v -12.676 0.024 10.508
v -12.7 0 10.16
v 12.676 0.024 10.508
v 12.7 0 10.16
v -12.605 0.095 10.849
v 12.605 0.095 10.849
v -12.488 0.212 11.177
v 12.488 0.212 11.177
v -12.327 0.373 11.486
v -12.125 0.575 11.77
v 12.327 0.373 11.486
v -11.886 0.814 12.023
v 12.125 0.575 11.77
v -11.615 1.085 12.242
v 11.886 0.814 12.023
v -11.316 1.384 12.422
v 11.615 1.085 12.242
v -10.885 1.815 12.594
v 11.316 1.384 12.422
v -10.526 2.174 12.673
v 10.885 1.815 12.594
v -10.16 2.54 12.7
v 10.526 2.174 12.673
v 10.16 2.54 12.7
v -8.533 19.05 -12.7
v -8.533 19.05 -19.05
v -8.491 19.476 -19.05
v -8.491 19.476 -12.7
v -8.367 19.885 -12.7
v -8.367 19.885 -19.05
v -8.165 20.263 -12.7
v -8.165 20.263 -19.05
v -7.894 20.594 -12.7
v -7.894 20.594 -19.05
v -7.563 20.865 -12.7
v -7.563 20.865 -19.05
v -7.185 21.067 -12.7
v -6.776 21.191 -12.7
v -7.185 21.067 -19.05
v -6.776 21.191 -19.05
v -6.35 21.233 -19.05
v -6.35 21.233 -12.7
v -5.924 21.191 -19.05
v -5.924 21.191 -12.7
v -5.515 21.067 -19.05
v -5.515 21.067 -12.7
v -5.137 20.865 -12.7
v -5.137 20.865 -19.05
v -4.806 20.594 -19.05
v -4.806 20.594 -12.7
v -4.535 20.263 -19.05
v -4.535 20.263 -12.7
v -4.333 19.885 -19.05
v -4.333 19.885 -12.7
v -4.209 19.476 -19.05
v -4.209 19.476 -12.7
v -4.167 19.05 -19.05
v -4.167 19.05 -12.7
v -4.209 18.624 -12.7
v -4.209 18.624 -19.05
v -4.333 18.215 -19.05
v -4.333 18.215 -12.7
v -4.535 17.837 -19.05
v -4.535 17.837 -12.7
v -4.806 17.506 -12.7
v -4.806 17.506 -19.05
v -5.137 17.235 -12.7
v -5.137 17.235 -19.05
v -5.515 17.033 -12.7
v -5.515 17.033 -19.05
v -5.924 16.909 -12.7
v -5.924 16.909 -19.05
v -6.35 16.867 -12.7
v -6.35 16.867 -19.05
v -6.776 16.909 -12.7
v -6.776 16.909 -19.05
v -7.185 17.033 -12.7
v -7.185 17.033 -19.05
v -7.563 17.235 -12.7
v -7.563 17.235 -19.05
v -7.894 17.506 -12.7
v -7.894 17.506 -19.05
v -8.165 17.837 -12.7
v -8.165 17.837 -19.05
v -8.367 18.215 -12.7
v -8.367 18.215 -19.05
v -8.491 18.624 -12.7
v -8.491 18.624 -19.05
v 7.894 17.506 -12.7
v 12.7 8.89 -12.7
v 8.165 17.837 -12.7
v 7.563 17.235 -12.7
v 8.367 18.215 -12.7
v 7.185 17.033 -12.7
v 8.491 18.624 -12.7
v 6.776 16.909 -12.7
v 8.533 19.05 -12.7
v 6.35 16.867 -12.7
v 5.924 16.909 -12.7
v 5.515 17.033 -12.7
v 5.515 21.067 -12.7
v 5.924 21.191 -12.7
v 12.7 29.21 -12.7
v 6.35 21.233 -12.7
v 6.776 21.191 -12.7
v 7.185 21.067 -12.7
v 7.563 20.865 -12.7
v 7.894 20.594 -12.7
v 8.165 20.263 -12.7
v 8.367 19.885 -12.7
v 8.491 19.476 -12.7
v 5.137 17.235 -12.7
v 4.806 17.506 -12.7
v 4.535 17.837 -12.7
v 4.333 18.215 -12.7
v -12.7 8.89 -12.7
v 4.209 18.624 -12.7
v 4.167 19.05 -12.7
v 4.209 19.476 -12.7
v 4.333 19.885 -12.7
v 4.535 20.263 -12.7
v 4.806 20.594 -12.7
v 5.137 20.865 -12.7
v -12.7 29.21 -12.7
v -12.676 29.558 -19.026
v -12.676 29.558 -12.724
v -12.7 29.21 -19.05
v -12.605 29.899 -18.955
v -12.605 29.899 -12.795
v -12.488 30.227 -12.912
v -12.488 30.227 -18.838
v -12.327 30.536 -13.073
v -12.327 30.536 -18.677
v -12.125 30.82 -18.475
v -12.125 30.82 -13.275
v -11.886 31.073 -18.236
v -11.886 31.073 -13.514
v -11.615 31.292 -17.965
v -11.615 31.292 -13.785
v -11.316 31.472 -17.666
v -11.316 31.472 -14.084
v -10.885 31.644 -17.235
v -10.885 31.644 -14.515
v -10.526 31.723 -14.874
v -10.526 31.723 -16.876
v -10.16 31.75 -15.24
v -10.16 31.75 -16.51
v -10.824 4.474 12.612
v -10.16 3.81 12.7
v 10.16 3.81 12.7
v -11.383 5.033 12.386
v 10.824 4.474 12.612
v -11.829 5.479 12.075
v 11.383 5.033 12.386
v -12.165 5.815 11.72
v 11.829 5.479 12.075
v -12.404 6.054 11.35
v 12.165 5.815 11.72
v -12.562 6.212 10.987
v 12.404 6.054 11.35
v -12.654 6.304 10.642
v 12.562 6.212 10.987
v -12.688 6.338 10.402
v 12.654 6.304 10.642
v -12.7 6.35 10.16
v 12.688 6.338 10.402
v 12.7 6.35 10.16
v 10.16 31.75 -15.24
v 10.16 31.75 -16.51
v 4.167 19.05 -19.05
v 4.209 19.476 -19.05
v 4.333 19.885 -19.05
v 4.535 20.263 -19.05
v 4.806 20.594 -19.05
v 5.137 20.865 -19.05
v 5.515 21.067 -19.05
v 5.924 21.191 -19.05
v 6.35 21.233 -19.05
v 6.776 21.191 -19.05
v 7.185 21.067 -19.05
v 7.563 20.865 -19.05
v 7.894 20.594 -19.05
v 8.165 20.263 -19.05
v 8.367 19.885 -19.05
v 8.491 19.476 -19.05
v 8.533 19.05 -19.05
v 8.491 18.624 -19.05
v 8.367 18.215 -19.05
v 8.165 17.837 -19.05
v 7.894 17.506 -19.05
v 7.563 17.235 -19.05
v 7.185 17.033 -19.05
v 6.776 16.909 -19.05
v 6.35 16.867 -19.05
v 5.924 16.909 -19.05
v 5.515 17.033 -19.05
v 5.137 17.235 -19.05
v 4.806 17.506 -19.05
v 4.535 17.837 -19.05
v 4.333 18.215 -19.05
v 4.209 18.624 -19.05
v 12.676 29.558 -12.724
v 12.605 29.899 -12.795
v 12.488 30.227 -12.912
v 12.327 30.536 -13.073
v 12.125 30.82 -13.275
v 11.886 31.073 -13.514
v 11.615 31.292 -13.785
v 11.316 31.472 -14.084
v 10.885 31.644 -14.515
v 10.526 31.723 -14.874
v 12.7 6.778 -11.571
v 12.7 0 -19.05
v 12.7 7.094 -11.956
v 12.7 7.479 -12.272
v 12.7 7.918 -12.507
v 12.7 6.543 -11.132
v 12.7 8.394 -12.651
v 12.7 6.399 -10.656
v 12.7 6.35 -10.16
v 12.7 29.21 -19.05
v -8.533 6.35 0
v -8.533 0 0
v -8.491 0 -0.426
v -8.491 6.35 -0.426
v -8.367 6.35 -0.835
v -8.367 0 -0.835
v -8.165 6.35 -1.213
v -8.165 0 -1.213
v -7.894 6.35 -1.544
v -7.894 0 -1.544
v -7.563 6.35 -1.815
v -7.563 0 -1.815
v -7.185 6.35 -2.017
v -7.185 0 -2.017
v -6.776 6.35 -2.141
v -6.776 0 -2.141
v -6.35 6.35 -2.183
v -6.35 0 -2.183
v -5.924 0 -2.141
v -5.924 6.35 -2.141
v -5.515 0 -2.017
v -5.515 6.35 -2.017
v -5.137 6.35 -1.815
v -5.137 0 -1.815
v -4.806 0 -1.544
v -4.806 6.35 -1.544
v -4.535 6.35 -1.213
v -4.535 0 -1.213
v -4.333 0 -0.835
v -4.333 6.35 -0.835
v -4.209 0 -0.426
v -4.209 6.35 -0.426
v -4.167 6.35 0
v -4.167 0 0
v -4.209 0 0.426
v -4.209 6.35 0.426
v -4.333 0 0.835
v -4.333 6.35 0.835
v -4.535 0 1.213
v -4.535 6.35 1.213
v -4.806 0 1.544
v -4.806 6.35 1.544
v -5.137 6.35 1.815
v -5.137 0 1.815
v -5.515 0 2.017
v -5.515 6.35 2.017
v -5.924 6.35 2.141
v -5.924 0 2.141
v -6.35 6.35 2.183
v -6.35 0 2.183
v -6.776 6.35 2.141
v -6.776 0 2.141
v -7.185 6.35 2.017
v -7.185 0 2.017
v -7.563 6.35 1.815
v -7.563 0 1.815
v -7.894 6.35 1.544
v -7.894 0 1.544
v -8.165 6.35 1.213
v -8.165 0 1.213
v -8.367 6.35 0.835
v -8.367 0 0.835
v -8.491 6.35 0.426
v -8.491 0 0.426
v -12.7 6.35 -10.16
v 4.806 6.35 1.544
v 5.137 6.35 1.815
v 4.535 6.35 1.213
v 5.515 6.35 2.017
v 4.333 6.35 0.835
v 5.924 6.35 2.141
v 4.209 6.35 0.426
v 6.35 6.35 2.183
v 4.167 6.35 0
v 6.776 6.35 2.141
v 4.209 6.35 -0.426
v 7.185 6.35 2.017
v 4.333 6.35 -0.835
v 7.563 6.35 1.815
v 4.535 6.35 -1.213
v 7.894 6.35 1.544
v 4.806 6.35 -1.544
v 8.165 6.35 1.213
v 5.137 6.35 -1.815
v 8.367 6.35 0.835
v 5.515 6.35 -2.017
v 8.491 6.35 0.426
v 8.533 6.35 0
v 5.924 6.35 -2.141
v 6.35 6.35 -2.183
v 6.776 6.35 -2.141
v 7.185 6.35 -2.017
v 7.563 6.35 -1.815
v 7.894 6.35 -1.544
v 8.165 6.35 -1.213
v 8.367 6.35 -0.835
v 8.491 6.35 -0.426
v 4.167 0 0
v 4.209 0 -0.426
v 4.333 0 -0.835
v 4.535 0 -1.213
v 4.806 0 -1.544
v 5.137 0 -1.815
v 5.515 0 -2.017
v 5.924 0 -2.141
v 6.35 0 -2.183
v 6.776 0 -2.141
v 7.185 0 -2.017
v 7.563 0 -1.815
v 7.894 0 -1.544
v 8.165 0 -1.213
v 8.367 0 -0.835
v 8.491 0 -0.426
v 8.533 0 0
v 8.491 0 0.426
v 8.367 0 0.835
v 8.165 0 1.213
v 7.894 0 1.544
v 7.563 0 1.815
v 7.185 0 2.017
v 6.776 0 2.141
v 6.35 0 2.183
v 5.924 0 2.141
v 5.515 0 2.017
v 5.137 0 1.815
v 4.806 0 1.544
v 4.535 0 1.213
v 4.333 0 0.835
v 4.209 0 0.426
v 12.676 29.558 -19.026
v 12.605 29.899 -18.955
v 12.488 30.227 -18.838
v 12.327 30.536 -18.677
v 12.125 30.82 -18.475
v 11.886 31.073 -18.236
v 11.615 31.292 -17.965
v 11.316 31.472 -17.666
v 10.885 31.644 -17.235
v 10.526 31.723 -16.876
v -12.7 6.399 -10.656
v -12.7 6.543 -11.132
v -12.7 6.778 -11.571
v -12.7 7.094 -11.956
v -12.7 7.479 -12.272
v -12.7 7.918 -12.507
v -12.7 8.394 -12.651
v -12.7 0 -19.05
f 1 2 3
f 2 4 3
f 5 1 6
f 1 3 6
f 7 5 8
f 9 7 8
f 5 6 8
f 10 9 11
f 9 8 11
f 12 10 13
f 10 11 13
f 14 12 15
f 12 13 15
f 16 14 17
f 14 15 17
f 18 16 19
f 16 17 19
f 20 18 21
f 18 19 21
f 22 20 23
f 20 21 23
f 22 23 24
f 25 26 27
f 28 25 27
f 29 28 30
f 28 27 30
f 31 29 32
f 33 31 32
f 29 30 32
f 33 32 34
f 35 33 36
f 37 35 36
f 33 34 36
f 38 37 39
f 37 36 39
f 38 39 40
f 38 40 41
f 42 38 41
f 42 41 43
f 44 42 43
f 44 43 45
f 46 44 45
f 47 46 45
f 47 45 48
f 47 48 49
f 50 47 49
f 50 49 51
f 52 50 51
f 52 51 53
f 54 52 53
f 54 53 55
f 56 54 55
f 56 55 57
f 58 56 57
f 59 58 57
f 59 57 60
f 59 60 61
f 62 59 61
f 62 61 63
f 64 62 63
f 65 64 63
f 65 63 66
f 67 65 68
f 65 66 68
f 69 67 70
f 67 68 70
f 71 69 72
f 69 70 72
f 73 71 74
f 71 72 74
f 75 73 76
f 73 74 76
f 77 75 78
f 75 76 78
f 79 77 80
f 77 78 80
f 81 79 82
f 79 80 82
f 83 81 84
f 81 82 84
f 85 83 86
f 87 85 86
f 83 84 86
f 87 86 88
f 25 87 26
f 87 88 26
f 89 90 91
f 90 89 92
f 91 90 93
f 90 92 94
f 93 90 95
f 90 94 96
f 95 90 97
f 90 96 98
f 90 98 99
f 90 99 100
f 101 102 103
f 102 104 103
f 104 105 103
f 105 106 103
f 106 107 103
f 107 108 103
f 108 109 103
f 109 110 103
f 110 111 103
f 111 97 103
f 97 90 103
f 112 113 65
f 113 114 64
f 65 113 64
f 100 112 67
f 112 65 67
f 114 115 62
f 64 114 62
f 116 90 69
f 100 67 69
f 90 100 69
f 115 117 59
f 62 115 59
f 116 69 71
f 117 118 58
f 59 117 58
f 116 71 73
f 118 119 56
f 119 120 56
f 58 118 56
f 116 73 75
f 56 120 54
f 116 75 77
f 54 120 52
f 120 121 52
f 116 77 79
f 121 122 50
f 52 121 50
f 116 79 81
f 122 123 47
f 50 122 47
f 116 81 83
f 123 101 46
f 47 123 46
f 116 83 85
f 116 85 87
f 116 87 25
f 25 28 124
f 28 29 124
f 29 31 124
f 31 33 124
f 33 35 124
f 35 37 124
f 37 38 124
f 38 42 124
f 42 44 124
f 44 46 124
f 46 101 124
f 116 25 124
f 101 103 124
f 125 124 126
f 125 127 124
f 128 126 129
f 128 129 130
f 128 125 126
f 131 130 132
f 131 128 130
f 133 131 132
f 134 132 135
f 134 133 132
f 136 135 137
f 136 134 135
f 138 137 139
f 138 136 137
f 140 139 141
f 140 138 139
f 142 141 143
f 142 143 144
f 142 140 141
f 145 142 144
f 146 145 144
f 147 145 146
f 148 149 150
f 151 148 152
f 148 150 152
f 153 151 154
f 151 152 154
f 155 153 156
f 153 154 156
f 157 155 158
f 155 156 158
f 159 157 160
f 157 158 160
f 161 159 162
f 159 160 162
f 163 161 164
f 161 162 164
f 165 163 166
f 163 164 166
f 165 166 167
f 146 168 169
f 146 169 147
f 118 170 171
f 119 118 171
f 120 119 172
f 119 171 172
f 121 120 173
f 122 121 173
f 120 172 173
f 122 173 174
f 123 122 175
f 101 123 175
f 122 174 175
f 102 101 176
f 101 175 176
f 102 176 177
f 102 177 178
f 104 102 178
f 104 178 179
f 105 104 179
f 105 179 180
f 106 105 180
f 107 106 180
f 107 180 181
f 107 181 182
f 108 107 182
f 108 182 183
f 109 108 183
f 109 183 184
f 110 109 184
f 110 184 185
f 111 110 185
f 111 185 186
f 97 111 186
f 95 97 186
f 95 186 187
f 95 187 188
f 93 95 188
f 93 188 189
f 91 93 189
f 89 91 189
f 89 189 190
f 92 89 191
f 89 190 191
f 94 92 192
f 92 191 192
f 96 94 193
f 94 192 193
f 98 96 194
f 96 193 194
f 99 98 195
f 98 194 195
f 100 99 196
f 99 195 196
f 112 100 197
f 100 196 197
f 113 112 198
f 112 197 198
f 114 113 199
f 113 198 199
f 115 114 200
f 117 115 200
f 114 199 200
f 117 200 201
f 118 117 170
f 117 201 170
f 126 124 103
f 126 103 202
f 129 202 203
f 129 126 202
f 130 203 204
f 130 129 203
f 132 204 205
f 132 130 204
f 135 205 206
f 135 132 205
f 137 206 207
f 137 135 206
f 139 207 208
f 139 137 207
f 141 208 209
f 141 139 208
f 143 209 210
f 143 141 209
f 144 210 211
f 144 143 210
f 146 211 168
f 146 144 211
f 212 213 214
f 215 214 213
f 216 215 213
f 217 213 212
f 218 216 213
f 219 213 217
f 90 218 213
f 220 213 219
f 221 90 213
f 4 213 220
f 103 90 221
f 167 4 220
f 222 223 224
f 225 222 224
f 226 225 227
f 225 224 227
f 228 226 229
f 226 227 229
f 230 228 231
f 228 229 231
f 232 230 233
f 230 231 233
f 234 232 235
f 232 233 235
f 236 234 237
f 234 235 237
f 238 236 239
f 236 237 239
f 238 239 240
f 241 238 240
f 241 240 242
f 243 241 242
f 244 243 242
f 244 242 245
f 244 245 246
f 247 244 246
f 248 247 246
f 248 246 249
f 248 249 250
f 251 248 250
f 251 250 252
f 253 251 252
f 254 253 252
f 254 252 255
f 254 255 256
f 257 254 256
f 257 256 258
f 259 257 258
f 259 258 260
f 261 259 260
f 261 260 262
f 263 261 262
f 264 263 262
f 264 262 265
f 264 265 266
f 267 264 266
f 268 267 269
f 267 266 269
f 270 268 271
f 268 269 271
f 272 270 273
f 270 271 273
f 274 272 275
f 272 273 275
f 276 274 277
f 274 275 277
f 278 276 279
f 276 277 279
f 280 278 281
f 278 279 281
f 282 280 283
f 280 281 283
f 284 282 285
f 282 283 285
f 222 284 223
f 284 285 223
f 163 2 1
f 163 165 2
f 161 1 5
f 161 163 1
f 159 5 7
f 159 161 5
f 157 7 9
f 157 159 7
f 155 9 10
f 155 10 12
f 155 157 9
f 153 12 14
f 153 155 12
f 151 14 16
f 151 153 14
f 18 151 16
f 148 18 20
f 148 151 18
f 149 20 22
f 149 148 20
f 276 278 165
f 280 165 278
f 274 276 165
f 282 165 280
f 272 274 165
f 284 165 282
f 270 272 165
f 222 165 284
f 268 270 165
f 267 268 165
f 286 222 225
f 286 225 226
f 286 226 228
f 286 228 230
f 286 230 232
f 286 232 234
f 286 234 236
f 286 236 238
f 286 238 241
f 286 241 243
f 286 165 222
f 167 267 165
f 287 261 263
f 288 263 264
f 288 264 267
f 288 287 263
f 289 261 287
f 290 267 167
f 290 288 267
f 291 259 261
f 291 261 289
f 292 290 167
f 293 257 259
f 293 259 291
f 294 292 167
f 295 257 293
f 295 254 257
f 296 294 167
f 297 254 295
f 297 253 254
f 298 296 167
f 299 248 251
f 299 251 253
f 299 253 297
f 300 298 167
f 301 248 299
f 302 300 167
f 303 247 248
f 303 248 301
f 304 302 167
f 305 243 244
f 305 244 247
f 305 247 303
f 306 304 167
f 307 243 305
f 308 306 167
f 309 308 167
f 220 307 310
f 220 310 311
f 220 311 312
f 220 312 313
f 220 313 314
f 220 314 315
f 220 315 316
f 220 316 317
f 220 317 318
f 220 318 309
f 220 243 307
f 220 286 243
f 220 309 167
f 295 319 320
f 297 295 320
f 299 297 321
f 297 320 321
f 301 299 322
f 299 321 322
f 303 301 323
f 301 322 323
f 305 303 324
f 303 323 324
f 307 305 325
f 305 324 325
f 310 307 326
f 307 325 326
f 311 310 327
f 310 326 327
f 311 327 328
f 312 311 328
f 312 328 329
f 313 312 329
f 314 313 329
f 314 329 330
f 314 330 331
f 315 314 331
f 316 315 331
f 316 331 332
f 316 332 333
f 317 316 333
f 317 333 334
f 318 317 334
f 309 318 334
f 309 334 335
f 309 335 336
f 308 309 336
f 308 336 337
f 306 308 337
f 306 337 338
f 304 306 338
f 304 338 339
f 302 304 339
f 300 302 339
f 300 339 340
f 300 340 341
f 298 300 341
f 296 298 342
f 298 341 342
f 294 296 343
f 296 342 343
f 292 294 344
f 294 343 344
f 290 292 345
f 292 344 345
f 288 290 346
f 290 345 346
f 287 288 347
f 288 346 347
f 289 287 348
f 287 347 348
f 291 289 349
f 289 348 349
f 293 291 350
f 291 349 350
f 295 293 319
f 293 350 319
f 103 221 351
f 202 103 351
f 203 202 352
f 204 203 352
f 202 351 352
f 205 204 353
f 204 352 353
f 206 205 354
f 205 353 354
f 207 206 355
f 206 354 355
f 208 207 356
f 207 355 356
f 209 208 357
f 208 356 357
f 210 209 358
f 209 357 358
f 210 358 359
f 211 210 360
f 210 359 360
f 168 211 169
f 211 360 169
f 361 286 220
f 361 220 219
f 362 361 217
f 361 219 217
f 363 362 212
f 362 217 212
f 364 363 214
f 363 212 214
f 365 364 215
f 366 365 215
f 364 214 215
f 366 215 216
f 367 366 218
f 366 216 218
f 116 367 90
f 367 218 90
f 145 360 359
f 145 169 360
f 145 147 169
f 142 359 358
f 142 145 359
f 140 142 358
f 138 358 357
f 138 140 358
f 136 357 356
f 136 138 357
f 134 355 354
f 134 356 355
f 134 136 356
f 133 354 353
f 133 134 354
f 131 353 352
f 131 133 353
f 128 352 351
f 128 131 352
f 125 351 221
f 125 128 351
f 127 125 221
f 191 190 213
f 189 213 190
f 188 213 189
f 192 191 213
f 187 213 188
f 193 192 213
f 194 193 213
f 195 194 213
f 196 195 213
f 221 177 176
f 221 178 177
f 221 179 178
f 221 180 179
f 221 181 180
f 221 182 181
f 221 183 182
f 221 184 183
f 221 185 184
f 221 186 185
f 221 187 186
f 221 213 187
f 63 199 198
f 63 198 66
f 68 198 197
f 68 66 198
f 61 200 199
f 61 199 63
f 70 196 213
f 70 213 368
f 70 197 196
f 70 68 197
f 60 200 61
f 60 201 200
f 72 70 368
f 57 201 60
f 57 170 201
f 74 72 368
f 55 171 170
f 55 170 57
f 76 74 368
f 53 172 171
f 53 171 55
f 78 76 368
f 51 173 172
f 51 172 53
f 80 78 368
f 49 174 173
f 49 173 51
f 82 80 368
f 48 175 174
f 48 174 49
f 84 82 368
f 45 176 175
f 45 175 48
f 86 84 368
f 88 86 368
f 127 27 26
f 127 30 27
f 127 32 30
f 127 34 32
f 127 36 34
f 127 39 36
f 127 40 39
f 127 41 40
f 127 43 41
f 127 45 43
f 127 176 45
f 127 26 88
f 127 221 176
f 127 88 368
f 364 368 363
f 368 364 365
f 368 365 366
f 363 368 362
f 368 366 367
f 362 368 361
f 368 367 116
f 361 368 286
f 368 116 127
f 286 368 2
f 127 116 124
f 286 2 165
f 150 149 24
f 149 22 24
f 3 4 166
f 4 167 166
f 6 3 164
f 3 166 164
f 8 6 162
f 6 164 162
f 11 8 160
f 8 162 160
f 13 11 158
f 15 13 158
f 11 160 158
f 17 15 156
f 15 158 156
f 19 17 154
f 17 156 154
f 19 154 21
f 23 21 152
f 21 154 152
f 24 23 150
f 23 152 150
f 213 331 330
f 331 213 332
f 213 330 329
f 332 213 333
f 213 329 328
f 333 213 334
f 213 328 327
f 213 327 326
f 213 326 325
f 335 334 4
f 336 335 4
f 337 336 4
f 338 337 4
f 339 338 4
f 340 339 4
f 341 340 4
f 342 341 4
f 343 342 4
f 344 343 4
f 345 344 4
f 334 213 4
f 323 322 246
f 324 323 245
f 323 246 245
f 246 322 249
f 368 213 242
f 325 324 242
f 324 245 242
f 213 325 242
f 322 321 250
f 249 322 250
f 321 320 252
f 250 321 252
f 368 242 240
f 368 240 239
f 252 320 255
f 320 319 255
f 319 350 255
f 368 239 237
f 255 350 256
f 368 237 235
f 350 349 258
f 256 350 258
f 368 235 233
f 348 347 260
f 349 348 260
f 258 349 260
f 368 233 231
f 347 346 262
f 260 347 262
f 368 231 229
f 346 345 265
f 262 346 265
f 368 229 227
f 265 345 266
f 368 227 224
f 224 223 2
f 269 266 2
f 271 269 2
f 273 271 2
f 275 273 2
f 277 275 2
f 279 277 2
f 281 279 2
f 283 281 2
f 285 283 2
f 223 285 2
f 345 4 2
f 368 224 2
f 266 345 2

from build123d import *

# Parameters (mm, degrees)
SKETCH1_W                        = 25.4
SKETCH1_H                        = 25.4
BOSS_EXTRUDE1_DEPTH              = 6.35
SKETCH2_W                        = 25.4
SKETCH2_H                        = 31.75
BOSS_EXTRUDE2_DEPTH              = 6.35
FILLET1_R                        = 2.54
F_11_64_0_17188_DIAMETER_HOLE1_D = 4.365752
F_11_64_0_17188_DIAMETER_HOLE2_D = 4.365752


with BuildPart() as part:
    # Sketch1 → Boss-Extrude1 (new body)
    with BuildSketch(Plane(origin=(0, 0, 0), x_dir=(1, 0, 0), z_dir=(0, 1, 0))):
        Rectangle(SKETCH1_W, SKETCH1_H)
    extrude(amount=BOSS_EXTRUDE1_DEPTH)

    # Sketch2 → Boss-Extrude2 (add)
    with BuildSketch(Plane(origin=(0, 0, -12.7), x_dir=(-1, 0, 0), z_dir=(0, 0, -1))):
        with Locations((0, 15.875)):
            Rectangle(SKETCH2_W, SKETCH2_H)
    extrude(amount=BOSS_EXTRUDE2_DEPTH)

    # Fillet1
    fillet1_edges = [part.edges().sort_by_distance(p)[0] for p in [
        (0, 31.75, -12.7),
        (-12.7, 31.75, -15.875),
        (12.7, 31.75, -15.875),
        (0, 6.35, 12.7),
        (0, 31.75, -19.05),
        (0, 0, 12.7),
        (12.7, 3.175, 12.7),
        (-12.7, 3.175, 12.7),
        (0, 6.35, -12.7),
    ]]
    fillet(fillet1_edges, radius=FILLET1_R)

    # 11/64 (0.17188) Diameter Hole1 (through all)
    with Locations(Plane(origin=(0, 6.35, 0), x_dir=(1, 0, 0), z_dir=(0, 1, 0))):
        with Locations((-6.35, 0), (6.35, 0)):
            Hole(F_11_64_0_17188_DIAMETER_HOLE1_D / 2)

    # 11/64 (0.17188) Diameter Hole2 (through all)
    with Locations(Plane.XY.offset(-12.7)):
        with Locations((6.35, 19.05), (-6.35, 19.05)):
            Hole(F_11_64_0_17188_DIAMETER_HOLE2_D / 2)


solid = part.part
